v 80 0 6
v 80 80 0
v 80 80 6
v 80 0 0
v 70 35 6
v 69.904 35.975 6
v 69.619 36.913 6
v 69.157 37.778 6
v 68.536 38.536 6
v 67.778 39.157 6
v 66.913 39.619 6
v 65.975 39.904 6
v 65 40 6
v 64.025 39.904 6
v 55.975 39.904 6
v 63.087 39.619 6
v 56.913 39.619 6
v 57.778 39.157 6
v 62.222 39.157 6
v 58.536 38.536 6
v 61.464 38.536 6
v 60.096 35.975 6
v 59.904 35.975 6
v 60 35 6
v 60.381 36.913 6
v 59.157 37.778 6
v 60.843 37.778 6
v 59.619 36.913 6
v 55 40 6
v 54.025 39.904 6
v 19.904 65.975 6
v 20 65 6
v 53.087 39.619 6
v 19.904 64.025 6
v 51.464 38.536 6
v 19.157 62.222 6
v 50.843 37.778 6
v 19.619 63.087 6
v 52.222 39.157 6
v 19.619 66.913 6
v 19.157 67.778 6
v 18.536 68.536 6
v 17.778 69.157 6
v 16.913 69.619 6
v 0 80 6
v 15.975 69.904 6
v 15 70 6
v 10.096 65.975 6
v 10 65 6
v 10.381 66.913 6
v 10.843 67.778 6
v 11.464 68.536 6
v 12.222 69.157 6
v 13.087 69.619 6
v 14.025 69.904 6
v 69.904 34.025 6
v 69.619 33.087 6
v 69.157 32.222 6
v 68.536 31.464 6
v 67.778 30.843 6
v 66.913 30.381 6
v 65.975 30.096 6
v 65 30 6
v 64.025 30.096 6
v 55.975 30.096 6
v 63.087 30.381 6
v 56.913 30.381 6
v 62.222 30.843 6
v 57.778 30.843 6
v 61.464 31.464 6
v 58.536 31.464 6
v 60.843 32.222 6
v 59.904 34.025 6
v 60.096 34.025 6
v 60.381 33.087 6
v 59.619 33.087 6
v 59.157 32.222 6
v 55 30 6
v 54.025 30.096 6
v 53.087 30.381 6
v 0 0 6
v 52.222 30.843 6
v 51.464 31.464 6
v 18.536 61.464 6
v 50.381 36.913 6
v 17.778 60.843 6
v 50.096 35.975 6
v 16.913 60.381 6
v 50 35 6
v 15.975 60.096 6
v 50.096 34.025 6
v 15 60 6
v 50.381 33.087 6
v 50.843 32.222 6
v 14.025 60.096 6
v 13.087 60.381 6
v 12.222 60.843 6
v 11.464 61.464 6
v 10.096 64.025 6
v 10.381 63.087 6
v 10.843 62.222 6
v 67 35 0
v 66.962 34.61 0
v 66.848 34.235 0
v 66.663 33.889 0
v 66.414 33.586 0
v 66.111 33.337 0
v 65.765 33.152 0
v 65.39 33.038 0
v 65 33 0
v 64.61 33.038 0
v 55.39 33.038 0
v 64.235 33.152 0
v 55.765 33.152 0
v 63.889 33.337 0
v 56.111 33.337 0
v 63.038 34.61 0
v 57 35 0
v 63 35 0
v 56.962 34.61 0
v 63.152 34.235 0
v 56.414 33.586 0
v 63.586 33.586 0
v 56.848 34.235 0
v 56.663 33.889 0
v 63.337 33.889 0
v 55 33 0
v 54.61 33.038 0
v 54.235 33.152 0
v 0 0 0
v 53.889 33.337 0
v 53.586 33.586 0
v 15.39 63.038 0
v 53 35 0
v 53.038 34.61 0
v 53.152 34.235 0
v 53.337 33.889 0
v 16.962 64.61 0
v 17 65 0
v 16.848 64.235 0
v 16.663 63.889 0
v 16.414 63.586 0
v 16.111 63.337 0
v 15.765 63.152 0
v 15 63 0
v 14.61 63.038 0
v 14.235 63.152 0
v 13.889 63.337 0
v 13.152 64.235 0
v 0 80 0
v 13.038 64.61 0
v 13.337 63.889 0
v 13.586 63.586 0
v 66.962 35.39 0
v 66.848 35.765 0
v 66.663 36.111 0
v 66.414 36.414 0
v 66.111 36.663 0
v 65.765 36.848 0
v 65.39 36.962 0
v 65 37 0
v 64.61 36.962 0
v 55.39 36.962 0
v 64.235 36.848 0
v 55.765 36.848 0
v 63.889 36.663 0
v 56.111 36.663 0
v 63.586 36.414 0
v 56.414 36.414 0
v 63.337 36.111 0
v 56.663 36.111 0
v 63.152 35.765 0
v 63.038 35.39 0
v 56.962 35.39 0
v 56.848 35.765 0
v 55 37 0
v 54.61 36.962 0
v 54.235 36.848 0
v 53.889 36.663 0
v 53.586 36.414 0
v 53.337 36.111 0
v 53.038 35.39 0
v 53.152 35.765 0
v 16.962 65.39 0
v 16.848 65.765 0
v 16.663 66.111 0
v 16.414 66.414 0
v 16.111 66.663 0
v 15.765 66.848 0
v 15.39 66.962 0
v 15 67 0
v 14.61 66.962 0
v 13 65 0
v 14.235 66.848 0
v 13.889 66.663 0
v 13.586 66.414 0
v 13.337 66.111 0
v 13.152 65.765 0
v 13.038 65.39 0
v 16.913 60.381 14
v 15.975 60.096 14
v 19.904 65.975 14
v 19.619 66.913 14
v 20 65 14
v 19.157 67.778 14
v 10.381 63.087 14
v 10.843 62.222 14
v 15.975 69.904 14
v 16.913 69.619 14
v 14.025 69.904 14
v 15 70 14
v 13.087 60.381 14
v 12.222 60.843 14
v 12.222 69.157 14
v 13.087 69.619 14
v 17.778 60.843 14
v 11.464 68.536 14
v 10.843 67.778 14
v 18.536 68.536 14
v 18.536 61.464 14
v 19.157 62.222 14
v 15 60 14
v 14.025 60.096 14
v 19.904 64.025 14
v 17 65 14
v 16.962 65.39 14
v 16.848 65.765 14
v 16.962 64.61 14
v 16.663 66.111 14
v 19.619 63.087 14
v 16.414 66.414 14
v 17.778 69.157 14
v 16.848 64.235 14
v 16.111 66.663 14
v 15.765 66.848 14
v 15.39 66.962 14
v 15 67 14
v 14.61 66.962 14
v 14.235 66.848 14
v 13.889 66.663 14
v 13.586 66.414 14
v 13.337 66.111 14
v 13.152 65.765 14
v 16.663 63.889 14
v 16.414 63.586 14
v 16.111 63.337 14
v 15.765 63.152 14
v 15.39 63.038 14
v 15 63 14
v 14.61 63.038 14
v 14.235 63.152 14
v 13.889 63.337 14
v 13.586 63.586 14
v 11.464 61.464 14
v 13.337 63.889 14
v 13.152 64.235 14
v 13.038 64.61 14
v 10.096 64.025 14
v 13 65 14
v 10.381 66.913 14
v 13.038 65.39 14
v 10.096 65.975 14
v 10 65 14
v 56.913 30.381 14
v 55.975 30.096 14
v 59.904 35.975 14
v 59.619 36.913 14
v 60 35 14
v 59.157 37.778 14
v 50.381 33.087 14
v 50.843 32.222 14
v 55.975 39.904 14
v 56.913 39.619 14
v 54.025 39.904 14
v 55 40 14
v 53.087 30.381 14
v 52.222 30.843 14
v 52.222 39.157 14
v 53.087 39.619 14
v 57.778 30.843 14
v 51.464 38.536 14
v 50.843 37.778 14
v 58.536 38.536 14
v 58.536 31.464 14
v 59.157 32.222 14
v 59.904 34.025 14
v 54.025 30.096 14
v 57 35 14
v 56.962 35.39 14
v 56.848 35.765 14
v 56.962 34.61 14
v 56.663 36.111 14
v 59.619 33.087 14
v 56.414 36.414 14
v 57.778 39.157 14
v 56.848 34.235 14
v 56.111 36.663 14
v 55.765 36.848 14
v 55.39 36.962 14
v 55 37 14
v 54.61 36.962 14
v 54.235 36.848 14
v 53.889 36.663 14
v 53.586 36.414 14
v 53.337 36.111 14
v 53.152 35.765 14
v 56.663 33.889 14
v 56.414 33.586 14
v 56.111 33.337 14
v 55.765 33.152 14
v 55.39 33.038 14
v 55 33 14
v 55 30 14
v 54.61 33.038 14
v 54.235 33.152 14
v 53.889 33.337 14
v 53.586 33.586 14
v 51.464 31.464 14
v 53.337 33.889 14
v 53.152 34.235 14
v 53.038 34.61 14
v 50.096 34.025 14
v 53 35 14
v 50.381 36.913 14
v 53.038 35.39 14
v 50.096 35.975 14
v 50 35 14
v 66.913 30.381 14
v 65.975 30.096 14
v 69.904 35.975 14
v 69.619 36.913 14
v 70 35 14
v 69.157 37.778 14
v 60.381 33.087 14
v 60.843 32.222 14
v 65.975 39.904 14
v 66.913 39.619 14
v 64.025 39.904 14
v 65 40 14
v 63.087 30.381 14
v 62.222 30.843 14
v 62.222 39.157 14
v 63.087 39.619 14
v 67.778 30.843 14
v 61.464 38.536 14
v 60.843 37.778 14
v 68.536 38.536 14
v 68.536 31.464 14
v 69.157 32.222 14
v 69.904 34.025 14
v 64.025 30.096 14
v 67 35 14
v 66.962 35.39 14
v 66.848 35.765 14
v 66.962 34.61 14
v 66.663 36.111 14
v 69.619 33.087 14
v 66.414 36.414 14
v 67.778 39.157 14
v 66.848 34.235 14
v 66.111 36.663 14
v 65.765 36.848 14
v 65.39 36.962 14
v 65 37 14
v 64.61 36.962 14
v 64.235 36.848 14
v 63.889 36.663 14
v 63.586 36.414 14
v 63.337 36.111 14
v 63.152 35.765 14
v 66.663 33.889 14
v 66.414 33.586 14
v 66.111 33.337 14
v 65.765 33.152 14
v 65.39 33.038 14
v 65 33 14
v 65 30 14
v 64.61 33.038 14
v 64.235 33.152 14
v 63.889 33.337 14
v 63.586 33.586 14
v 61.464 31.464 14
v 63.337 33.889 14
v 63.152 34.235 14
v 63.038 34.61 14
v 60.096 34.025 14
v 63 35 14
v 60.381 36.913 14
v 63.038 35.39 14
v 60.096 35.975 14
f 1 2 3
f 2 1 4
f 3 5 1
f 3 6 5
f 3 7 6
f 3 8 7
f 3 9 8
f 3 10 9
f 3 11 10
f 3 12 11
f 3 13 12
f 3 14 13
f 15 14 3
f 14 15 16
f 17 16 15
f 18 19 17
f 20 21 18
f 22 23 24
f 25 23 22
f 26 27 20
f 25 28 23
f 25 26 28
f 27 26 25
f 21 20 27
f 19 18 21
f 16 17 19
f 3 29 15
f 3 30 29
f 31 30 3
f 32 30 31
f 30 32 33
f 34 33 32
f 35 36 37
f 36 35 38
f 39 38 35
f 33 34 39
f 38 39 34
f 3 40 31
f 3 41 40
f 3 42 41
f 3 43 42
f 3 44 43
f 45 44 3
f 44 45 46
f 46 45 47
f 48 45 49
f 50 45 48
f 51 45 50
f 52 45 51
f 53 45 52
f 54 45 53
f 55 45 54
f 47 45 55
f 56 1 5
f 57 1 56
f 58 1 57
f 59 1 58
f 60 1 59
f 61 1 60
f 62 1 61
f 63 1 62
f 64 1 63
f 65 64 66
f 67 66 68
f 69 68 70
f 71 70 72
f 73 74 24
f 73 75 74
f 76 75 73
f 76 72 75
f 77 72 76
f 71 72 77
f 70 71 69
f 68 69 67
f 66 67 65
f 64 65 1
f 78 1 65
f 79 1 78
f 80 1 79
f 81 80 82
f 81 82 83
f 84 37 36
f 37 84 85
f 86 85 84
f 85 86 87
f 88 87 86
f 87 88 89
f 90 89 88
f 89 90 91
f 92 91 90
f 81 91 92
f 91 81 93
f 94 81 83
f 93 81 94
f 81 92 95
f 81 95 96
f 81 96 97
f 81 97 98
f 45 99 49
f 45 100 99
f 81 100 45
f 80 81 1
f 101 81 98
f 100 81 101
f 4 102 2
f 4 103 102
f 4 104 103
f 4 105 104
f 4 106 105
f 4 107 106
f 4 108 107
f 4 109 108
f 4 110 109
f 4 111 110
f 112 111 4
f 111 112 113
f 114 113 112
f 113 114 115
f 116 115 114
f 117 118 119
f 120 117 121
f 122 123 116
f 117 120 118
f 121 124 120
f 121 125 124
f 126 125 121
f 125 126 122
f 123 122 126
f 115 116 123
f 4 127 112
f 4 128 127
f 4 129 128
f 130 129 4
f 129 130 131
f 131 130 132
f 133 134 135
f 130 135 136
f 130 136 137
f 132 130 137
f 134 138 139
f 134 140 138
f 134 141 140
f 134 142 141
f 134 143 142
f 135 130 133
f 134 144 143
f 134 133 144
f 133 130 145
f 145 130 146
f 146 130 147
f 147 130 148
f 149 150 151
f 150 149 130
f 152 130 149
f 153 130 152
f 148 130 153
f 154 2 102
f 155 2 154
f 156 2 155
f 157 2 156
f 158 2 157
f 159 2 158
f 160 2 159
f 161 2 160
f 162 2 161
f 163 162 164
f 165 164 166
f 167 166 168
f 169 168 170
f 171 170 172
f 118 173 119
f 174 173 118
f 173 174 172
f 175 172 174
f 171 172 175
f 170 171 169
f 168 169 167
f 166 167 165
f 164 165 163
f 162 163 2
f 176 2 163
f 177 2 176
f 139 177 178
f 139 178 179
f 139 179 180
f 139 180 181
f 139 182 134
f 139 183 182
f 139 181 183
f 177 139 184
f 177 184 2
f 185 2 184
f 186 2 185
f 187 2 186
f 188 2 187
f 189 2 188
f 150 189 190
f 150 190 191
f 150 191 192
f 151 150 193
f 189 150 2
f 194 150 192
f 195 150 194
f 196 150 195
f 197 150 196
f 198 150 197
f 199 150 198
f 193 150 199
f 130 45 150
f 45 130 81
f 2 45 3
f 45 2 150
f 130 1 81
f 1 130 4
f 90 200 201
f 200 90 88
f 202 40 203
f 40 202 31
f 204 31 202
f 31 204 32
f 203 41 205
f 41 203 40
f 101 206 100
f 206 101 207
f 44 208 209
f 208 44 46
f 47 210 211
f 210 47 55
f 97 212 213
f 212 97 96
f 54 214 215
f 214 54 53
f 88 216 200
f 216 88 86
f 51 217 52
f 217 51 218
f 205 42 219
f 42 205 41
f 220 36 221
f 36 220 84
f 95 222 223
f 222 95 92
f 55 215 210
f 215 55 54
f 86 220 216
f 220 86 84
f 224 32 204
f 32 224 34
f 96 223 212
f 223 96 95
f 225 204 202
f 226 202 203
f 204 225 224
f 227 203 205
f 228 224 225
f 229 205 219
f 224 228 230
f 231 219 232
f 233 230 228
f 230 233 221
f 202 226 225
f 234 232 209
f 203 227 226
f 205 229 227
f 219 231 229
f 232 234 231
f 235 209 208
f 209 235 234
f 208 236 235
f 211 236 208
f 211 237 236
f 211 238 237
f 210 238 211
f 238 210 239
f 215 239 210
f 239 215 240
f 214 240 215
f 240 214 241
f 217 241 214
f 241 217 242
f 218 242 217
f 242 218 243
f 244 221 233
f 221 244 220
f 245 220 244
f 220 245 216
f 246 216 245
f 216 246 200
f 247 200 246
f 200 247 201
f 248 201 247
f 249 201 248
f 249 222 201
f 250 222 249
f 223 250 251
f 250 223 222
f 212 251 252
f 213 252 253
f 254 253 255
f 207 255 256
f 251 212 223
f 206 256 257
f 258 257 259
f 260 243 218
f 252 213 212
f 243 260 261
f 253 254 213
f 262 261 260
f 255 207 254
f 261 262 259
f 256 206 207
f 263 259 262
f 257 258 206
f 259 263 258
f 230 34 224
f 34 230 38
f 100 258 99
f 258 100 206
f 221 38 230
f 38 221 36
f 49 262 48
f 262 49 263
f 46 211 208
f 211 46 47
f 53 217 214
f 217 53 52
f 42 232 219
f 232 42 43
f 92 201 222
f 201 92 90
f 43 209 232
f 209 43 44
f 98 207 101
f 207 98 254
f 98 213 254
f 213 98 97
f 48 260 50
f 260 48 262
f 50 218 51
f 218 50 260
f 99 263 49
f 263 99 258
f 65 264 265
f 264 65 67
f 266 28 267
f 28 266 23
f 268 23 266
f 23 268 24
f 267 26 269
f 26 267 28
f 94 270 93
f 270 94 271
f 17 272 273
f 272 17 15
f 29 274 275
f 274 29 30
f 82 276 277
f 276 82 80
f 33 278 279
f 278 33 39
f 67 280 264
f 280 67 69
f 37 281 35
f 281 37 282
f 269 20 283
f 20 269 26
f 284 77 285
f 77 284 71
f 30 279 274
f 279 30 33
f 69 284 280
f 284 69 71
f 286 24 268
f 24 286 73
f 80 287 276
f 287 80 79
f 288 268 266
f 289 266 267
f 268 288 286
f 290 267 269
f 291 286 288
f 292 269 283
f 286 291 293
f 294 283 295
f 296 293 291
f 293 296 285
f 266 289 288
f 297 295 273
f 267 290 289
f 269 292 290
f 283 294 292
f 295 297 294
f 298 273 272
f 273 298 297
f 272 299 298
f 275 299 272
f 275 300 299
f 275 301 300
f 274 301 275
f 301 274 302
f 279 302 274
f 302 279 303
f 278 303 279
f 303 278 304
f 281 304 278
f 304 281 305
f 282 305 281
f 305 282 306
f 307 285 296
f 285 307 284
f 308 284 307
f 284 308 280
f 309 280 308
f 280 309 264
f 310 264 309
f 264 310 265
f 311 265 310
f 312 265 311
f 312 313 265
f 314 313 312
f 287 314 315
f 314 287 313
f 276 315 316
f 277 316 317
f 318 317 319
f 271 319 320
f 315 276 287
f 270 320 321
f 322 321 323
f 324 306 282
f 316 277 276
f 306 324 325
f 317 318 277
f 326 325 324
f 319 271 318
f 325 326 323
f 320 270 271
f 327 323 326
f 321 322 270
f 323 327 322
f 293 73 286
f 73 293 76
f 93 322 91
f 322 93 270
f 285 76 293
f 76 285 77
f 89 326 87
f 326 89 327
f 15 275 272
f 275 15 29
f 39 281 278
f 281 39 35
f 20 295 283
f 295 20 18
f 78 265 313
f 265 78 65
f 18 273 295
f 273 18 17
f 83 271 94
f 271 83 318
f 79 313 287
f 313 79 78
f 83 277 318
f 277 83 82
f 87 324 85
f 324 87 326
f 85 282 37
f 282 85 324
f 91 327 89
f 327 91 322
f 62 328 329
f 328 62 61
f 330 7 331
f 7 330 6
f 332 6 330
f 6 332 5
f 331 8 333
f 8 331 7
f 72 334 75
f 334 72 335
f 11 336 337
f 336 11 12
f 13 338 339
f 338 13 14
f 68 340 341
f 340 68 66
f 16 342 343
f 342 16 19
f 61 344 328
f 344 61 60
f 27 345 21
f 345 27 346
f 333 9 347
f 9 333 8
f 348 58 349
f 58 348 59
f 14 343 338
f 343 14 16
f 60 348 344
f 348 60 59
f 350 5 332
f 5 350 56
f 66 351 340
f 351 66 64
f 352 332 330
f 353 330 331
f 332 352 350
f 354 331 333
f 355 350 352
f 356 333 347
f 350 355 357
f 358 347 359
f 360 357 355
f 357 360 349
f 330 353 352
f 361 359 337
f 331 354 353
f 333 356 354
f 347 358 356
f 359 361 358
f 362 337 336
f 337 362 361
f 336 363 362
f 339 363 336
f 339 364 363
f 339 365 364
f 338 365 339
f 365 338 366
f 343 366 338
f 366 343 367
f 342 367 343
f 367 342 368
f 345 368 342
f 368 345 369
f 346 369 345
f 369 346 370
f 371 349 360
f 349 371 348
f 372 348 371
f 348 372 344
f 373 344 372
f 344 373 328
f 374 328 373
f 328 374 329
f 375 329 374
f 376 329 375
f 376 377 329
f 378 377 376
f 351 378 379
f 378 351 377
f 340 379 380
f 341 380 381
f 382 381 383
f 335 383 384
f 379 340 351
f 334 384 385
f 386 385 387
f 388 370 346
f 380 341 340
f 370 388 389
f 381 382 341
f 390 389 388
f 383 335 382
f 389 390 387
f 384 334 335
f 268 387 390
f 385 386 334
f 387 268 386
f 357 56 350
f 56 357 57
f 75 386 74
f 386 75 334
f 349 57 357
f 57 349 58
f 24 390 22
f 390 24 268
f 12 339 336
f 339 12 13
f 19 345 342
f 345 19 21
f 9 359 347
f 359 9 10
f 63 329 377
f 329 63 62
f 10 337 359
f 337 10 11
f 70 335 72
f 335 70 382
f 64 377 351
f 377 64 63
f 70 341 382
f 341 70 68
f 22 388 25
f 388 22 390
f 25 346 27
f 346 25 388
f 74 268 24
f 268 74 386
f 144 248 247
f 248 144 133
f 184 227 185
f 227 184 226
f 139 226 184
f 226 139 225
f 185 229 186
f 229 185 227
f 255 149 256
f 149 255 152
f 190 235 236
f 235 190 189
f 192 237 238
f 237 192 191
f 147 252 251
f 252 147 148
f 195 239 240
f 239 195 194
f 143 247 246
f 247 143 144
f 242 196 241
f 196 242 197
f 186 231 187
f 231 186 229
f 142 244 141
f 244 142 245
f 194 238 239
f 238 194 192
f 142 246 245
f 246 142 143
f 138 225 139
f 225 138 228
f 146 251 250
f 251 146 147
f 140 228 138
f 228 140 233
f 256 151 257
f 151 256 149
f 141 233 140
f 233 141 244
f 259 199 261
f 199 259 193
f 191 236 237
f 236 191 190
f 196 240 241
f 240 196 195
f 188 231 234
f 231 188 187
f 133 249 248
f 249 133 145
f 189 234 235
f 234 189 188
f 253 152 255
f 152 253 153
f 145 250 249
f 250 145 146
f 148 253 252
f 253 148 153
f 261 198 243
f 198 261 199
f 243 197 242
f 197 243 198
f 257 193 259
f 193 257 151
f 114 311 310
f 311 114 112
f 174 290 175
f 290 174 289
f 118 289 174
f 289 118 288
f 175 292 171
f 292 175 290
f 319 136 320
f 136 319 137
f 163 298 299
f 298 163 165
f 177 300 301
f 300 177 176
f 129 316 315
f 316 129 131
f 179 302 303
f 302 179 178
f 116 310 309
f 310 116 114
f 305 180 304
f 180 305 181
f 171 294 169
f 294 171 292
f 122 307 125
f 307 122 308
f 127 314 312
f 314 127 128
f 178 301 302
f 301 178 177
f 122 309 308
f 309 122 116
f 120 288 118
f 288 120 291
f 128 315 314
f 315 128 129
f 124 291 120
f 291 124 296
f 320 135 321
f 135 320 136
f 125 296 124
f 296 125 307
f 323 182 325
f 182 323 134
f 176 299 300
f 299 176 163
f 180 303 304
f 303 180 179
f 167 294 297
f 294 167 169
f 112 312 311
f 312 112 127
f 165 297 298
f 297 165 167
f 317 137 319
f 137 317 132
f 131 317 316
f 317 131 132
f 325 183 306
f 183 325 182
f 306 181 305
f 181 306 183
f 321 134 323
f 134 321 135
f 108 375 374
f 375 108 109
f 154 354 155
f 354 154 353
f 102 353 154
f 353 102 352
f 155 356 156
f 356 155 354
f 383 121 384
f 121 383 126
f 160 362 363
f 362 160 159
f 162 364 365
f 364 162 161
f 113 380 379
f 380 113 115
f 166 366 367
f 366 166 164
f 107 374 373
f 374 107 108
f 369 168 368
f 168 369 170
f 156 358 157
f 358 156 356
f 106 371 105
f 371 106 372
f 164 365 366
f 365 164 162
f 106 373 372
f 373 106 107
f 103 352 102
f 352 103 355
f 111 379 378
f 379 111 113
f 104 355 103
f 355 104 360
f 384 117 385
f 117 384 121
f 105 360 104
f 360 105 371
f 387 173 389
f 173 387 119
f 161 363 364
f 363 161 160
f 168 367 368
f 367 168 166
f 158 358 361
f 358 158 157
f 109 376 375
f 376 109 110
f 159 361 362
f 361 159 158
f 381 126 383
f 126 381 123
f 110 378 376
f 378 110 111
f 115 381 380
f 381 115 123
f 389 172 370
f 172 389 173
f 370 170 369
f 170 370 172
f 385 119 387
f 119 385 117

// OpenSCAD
$fn = 32;

// ----------------------------------------------------------------------
// Boss field: plate with bosses at given coordinates
// ----------------------------------------------------------------------

// --- parameters (mm) ---
plate_l = 80;             // plate length, X
plate_w = 80;             // plate width, Y
plate_t = 6;              // plate thickness, Z
boss_d = 10;              // boss diameter
boss_h = 8;               // boss height above the plate
bore_d = 4;               // boss bore

total_h = plate_t + boss_h;  // overall height

difference() {
  union() {
    cube([plate_l, plate_w, plate_t]);
    translate([15, 65, plate_t]) cylinder(h = boss_h, d = boss_d);
    translate([55, 35, plate_t]) cylinder(h = boss_h, d = boss_d);
    translate([65, 35, plate_t]) cylinder(h = boss_h, d = boss_d);
  }
  translate([15, 65, -1]) cylinder(h = total_h + 2, d = bore_d);
  translate([55, 35, -1]) cylinder(h = total_h + 2, d = bore_d);
  translate([65, 35, -1]) cylinder(h = total_h + 2, d = bore_d);
}
